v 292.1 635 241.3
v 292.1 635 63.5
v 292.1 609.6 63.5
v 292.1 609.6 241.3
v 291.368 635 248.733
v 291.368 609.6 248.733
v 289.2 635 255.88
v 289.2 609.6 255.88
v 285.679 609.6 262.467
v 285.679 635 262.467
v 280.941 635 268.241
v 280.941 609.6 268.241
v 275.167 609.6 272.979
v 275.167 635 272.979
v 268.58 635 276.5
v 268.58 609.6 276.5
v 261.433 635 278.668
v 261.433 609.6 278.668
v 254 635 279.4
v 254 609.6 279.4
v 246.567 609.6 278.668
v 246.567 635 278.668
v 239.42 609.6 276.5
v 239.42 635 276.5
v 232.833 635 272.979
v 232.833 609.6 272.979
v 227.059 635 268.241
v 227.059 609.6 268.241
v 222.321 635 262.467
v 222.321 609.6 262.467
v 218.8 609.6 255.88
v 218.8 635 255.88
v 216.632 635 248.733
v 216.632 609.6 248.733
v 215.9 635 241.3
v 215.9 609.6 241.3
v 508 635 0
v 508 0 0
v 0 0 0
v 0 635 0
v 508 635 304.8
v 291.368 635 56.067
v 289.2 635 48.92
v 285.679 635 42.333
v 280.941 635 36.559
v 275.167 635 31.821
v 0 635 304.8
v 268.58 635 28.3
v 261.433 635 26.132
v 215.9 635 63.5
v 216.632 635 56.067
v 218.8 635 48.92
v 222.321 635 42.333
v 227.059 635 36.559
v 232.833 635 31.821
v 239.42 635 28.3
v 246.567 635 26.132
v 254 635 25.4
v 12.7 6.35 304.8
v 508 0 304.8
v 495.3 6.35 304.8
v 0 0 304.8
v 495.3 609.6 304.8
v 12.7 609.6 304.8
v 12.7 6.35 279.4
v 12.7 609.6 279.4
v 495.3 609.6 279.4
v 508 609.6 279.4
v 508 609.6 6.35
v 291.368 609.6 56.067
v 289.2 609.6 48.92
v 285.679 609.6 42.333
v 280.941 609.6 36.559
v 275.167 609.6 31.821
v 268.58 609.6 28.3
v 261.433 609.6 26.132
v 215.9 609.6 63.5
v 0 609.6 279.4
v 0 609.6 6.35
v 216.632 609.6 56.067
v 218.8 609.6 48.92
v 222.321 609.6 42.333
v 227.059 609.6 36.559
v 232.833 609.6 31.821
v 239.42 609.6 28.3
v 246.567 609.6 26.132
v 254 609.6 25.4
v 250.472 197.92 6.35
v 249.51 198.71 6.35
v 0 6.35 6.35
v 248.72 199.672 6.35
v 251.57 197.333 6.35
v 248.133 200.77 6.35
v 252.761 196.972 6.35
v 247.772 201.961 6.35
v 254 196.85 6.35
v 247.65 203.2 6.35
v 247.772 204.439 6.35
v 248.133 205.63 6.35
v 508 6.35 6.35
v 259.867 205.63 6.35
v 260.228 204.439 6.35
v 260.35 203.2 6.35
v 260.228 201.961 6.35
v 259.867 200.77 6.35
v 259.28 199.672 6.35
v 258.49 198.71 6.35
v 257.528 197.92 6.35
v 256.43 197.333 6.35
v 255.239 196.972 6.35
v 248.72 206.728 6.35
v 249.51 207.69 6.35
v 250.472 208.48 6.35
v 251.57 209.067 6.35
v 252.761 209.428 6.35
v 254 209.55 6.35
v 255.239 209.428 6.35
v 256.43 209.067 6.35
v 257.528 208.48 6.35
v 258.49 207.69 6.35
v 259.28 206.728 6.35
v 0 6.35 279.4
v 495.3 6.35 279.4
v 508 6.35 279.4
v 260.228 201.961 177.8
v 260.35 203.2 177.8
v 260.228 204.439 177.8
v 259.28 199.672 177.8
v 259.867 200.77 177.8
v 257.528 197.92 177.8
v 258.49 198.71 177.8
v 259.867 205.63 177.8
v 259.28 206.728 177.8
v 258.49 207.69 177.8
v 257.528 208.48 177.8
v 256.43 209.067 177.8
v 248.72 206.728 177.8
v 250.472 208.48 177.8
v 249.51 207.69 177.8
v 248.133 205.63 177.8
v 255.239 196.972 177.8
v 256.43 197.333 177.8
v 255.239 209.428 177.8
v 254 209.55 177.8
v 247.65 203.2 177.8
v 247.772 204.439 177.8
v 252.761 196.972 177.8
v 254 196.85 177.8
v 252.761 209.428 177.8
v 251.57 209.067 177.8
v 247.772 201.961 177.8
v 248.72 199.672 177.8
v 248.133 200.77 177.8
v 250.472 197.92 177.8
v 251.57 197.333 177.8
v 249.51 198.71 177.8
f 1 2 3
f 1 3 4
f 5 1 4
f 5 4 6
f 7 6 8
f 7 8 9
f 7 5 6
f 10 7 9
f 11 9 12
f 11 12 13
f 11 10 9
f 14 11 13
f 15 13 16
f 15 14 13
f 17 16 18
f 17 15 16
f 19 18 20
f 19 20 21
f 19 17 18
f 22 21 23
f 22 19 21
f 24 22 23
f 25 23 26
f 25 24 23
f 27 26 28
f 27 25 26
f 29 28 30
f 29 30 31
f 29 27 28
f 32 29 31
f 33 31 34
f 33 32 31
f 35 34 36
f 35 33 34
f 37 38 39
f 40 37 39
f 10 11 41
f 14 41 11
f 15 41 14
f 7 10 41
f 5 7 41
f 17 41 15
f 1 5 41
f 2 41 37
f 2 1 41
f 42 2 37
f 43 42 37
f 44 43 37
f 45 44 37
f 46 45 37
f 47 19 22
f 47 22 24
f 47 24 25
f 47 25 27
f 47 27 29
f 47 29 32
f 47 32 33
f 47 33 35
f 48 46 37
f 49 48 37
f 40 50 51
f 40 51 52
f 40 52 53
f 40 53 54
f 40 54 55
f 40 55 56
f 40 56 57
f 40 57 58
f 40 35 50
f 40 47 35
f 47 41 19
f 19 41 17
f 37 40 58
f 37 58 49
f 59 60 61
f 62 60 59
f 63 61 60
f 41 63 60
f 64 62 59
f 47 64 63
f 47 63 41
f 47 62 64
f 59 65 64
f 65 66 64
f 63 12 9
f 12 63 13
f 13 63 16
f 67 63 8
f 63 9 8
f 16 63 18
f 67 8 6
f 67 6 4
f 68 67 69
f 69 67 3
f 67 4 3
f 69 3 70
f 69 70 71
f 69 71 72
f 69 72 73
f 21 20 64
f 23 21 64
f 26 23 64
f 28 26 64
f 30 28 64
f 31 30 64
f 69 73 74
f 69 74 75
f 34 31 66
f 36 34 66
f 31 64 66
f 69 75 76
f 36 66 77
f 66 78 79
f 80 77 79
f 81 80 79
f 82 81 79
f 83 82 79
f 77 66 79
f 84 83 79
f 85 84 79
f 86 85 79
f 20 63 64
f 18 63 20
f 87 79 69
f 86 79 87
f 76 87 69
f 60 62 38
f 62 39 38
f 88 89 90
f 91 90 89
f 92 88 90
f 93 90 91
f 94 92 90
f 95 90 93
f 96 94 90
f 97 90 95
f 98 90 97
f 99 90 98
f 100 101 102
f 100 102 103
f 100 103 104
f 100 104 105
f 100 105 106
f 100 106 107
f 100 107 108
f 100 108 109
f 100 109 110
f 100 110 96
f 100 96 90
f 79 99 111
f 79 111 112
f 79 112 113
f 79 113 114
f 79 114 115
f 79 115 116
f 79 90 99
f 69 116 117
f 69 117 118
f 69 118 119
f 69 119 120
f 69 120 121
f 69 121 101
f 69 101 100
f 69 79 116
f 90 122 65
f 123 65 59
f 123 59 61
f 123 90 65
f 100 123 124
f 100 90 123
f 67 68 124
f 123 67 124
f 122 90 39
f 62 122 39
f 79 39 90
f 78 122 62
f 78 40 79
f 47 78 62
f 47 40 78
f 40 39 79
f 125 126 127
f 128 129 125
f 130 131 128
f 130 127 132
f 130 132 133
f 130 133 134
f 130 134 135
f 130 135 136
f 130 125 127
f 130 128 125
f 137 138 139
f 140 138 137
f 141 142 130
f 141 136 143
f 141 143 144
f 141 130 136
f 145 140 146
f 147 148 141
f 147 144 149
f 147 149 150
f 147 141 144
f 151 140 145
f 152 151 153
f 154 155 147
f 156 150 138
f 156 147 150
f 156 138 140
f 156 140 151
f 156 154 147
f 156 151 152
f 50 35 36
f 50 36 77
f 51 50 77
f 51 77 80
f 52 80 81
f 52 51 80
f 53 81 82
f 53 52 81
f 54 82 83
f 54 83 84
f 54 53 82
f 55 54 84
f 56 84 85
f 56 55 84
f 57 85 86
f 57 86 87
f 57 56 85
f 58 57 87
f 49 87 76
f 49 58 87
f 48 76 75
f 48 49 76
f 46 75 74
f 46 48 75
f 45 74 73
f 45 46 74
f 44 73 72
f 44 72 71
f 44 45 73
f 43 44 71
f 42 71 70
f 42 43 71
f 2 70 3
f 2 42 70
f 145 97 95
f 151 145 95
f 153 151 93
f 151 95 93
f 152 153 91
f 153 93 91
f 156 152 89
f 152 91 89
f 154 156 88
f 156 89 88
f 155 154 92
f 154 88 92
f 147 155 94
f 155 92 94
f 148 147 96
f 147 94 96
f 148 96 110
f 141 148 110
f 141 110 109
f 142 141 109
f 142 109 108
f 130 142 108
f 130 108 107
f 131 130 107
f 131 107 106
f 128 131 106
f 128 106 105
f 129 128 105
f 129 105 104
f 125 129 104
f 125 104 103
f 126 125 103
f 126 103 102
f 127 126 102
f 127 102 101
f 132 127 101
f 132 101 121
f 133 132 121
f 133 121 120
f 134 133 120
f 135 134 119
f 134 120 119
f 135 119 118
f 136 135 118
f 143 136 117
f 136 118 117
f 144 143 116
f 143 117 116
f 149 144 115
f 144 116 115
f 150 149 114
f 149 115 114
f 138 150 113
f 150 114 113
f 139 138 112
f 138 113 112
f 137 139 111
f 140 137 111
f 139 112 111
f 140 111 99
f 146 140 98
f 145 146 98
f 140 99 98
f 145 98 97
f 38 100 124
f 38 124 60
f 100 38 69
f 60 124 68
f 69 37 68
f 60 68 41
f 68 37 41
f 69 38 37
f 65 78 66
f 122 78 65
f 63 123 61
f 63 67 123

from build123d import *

# Parameters (mm, degrees)
SKETCH1_W           = 508
SKETCH1_H           = 635
BOSS_EXTRUDE1_DEPTH = 6.35
SKETCH2_R           = 6.35
BOSS_EXTRUDE2_DEPTH = 177.8
SKETCH3_W           = 508
SKETCH3_H           = 298.45
BOSS_EXTRUDE3_DEPTH = 6.35
BOSS_EXTRUDE4_DEPTH = 12.7
SKETCH6_W           = 298.45
SKETCH6_H           = 25.4
BOSS_EXTRUDE6_DEPTH = 482.6
CUT_EXTRUDE1_DEPTH  = 25.4


with BuildPart() as part:
    # Sketch1 → Boss-Extrude1 (new body)
    with BuildSketch(Plane.XY):
        with Locations((254, 317.5)):
            Rectangle(SKETCH1_W, SKETCH1_H)
    extrude(amount=BOSS_EXTRUDE1_DEPTH)

    # Sketch2 → Boss-Extrude2 (add)
    with BuildSketch(Plane.XY):
        with Locations(Location((254, 203.2, 0), (0, 0, 180))):
            Circle(SKETCH2_R)
    extrude(amount=BOSS_EXTRUDE2_DEPTH)

    # Sketch3 → Boss-Extrude3 (add)
    with BuildSketch(Plane(origin=(0, 0, 0), x_dir=(1, 0, 0), z_dir=(0, 1, 0))):
        with Locations((254, -155.575)):
            Rectangle(SKETCH3_W, SKETCH3_H)
    extrude(amount=BOSS_EXTRUDE3_DEPTH)

    # Sketch4 → Boss-Extrude4 (add)
    with BuildSketch(Plane(origin=(0, 0, 0), x_dir=(0, 0, -1), z_dir=(1, 0, 0))):
        Polygon((-304.8, 6.35), (-304.8, 635), (-6.35, 635), (-6.35, 609.6), (-279.4, 609.6), (-279.4, 6.35), align=None)
    boss_extrude4 = extrude(amount=BOSS_EXTRUDE4_DEPTH)

    # Mirror1: Boss-Extrude4 across plane
    add(boss_extrude4.mirror(Plane(origin=(254, 0, 0), x_dir=(0, 0, 1), z_dir=(1, 0, 0))))

    # Sketch6 → Boss-Extrude6 (add)
    with BuildSketch(Plane(origin=(12.7, 0, 0), x_dir=(0, 0, -1), z_dir=(1, 0, 0))):
        with Locations((-155.575, 622.3)):
            Rectangle(SKETCH6_W, SKETCH6_H)
    extrude(amount=BOSS_EXTRUDE6_DEPTH)

    # Sketch7 → Cut-Extrude1 (cut)
    with BuildSketch(Plane(origin=(0, 635, 0), x_dir=(1, 0, 0), z_dir=(0, 1, 0))):
        with BuildLine():
            Line((292.1, -63.5), (292.1, -241.3))
            ThreePointArc((292.1, -241.3), (254, -279.4), (215.9, -241.3))
            Line((215.9, -241.3), (215.9, -63.5))
            ThreePointArc((215.9, -63.5), (254, -25.4), (292.1, -63.5))
        make_face()
    extrude(amount=-CUT_EXTRUDE1_DEPTH, mode=Mode.SUBTRACT)


solid = part.part
